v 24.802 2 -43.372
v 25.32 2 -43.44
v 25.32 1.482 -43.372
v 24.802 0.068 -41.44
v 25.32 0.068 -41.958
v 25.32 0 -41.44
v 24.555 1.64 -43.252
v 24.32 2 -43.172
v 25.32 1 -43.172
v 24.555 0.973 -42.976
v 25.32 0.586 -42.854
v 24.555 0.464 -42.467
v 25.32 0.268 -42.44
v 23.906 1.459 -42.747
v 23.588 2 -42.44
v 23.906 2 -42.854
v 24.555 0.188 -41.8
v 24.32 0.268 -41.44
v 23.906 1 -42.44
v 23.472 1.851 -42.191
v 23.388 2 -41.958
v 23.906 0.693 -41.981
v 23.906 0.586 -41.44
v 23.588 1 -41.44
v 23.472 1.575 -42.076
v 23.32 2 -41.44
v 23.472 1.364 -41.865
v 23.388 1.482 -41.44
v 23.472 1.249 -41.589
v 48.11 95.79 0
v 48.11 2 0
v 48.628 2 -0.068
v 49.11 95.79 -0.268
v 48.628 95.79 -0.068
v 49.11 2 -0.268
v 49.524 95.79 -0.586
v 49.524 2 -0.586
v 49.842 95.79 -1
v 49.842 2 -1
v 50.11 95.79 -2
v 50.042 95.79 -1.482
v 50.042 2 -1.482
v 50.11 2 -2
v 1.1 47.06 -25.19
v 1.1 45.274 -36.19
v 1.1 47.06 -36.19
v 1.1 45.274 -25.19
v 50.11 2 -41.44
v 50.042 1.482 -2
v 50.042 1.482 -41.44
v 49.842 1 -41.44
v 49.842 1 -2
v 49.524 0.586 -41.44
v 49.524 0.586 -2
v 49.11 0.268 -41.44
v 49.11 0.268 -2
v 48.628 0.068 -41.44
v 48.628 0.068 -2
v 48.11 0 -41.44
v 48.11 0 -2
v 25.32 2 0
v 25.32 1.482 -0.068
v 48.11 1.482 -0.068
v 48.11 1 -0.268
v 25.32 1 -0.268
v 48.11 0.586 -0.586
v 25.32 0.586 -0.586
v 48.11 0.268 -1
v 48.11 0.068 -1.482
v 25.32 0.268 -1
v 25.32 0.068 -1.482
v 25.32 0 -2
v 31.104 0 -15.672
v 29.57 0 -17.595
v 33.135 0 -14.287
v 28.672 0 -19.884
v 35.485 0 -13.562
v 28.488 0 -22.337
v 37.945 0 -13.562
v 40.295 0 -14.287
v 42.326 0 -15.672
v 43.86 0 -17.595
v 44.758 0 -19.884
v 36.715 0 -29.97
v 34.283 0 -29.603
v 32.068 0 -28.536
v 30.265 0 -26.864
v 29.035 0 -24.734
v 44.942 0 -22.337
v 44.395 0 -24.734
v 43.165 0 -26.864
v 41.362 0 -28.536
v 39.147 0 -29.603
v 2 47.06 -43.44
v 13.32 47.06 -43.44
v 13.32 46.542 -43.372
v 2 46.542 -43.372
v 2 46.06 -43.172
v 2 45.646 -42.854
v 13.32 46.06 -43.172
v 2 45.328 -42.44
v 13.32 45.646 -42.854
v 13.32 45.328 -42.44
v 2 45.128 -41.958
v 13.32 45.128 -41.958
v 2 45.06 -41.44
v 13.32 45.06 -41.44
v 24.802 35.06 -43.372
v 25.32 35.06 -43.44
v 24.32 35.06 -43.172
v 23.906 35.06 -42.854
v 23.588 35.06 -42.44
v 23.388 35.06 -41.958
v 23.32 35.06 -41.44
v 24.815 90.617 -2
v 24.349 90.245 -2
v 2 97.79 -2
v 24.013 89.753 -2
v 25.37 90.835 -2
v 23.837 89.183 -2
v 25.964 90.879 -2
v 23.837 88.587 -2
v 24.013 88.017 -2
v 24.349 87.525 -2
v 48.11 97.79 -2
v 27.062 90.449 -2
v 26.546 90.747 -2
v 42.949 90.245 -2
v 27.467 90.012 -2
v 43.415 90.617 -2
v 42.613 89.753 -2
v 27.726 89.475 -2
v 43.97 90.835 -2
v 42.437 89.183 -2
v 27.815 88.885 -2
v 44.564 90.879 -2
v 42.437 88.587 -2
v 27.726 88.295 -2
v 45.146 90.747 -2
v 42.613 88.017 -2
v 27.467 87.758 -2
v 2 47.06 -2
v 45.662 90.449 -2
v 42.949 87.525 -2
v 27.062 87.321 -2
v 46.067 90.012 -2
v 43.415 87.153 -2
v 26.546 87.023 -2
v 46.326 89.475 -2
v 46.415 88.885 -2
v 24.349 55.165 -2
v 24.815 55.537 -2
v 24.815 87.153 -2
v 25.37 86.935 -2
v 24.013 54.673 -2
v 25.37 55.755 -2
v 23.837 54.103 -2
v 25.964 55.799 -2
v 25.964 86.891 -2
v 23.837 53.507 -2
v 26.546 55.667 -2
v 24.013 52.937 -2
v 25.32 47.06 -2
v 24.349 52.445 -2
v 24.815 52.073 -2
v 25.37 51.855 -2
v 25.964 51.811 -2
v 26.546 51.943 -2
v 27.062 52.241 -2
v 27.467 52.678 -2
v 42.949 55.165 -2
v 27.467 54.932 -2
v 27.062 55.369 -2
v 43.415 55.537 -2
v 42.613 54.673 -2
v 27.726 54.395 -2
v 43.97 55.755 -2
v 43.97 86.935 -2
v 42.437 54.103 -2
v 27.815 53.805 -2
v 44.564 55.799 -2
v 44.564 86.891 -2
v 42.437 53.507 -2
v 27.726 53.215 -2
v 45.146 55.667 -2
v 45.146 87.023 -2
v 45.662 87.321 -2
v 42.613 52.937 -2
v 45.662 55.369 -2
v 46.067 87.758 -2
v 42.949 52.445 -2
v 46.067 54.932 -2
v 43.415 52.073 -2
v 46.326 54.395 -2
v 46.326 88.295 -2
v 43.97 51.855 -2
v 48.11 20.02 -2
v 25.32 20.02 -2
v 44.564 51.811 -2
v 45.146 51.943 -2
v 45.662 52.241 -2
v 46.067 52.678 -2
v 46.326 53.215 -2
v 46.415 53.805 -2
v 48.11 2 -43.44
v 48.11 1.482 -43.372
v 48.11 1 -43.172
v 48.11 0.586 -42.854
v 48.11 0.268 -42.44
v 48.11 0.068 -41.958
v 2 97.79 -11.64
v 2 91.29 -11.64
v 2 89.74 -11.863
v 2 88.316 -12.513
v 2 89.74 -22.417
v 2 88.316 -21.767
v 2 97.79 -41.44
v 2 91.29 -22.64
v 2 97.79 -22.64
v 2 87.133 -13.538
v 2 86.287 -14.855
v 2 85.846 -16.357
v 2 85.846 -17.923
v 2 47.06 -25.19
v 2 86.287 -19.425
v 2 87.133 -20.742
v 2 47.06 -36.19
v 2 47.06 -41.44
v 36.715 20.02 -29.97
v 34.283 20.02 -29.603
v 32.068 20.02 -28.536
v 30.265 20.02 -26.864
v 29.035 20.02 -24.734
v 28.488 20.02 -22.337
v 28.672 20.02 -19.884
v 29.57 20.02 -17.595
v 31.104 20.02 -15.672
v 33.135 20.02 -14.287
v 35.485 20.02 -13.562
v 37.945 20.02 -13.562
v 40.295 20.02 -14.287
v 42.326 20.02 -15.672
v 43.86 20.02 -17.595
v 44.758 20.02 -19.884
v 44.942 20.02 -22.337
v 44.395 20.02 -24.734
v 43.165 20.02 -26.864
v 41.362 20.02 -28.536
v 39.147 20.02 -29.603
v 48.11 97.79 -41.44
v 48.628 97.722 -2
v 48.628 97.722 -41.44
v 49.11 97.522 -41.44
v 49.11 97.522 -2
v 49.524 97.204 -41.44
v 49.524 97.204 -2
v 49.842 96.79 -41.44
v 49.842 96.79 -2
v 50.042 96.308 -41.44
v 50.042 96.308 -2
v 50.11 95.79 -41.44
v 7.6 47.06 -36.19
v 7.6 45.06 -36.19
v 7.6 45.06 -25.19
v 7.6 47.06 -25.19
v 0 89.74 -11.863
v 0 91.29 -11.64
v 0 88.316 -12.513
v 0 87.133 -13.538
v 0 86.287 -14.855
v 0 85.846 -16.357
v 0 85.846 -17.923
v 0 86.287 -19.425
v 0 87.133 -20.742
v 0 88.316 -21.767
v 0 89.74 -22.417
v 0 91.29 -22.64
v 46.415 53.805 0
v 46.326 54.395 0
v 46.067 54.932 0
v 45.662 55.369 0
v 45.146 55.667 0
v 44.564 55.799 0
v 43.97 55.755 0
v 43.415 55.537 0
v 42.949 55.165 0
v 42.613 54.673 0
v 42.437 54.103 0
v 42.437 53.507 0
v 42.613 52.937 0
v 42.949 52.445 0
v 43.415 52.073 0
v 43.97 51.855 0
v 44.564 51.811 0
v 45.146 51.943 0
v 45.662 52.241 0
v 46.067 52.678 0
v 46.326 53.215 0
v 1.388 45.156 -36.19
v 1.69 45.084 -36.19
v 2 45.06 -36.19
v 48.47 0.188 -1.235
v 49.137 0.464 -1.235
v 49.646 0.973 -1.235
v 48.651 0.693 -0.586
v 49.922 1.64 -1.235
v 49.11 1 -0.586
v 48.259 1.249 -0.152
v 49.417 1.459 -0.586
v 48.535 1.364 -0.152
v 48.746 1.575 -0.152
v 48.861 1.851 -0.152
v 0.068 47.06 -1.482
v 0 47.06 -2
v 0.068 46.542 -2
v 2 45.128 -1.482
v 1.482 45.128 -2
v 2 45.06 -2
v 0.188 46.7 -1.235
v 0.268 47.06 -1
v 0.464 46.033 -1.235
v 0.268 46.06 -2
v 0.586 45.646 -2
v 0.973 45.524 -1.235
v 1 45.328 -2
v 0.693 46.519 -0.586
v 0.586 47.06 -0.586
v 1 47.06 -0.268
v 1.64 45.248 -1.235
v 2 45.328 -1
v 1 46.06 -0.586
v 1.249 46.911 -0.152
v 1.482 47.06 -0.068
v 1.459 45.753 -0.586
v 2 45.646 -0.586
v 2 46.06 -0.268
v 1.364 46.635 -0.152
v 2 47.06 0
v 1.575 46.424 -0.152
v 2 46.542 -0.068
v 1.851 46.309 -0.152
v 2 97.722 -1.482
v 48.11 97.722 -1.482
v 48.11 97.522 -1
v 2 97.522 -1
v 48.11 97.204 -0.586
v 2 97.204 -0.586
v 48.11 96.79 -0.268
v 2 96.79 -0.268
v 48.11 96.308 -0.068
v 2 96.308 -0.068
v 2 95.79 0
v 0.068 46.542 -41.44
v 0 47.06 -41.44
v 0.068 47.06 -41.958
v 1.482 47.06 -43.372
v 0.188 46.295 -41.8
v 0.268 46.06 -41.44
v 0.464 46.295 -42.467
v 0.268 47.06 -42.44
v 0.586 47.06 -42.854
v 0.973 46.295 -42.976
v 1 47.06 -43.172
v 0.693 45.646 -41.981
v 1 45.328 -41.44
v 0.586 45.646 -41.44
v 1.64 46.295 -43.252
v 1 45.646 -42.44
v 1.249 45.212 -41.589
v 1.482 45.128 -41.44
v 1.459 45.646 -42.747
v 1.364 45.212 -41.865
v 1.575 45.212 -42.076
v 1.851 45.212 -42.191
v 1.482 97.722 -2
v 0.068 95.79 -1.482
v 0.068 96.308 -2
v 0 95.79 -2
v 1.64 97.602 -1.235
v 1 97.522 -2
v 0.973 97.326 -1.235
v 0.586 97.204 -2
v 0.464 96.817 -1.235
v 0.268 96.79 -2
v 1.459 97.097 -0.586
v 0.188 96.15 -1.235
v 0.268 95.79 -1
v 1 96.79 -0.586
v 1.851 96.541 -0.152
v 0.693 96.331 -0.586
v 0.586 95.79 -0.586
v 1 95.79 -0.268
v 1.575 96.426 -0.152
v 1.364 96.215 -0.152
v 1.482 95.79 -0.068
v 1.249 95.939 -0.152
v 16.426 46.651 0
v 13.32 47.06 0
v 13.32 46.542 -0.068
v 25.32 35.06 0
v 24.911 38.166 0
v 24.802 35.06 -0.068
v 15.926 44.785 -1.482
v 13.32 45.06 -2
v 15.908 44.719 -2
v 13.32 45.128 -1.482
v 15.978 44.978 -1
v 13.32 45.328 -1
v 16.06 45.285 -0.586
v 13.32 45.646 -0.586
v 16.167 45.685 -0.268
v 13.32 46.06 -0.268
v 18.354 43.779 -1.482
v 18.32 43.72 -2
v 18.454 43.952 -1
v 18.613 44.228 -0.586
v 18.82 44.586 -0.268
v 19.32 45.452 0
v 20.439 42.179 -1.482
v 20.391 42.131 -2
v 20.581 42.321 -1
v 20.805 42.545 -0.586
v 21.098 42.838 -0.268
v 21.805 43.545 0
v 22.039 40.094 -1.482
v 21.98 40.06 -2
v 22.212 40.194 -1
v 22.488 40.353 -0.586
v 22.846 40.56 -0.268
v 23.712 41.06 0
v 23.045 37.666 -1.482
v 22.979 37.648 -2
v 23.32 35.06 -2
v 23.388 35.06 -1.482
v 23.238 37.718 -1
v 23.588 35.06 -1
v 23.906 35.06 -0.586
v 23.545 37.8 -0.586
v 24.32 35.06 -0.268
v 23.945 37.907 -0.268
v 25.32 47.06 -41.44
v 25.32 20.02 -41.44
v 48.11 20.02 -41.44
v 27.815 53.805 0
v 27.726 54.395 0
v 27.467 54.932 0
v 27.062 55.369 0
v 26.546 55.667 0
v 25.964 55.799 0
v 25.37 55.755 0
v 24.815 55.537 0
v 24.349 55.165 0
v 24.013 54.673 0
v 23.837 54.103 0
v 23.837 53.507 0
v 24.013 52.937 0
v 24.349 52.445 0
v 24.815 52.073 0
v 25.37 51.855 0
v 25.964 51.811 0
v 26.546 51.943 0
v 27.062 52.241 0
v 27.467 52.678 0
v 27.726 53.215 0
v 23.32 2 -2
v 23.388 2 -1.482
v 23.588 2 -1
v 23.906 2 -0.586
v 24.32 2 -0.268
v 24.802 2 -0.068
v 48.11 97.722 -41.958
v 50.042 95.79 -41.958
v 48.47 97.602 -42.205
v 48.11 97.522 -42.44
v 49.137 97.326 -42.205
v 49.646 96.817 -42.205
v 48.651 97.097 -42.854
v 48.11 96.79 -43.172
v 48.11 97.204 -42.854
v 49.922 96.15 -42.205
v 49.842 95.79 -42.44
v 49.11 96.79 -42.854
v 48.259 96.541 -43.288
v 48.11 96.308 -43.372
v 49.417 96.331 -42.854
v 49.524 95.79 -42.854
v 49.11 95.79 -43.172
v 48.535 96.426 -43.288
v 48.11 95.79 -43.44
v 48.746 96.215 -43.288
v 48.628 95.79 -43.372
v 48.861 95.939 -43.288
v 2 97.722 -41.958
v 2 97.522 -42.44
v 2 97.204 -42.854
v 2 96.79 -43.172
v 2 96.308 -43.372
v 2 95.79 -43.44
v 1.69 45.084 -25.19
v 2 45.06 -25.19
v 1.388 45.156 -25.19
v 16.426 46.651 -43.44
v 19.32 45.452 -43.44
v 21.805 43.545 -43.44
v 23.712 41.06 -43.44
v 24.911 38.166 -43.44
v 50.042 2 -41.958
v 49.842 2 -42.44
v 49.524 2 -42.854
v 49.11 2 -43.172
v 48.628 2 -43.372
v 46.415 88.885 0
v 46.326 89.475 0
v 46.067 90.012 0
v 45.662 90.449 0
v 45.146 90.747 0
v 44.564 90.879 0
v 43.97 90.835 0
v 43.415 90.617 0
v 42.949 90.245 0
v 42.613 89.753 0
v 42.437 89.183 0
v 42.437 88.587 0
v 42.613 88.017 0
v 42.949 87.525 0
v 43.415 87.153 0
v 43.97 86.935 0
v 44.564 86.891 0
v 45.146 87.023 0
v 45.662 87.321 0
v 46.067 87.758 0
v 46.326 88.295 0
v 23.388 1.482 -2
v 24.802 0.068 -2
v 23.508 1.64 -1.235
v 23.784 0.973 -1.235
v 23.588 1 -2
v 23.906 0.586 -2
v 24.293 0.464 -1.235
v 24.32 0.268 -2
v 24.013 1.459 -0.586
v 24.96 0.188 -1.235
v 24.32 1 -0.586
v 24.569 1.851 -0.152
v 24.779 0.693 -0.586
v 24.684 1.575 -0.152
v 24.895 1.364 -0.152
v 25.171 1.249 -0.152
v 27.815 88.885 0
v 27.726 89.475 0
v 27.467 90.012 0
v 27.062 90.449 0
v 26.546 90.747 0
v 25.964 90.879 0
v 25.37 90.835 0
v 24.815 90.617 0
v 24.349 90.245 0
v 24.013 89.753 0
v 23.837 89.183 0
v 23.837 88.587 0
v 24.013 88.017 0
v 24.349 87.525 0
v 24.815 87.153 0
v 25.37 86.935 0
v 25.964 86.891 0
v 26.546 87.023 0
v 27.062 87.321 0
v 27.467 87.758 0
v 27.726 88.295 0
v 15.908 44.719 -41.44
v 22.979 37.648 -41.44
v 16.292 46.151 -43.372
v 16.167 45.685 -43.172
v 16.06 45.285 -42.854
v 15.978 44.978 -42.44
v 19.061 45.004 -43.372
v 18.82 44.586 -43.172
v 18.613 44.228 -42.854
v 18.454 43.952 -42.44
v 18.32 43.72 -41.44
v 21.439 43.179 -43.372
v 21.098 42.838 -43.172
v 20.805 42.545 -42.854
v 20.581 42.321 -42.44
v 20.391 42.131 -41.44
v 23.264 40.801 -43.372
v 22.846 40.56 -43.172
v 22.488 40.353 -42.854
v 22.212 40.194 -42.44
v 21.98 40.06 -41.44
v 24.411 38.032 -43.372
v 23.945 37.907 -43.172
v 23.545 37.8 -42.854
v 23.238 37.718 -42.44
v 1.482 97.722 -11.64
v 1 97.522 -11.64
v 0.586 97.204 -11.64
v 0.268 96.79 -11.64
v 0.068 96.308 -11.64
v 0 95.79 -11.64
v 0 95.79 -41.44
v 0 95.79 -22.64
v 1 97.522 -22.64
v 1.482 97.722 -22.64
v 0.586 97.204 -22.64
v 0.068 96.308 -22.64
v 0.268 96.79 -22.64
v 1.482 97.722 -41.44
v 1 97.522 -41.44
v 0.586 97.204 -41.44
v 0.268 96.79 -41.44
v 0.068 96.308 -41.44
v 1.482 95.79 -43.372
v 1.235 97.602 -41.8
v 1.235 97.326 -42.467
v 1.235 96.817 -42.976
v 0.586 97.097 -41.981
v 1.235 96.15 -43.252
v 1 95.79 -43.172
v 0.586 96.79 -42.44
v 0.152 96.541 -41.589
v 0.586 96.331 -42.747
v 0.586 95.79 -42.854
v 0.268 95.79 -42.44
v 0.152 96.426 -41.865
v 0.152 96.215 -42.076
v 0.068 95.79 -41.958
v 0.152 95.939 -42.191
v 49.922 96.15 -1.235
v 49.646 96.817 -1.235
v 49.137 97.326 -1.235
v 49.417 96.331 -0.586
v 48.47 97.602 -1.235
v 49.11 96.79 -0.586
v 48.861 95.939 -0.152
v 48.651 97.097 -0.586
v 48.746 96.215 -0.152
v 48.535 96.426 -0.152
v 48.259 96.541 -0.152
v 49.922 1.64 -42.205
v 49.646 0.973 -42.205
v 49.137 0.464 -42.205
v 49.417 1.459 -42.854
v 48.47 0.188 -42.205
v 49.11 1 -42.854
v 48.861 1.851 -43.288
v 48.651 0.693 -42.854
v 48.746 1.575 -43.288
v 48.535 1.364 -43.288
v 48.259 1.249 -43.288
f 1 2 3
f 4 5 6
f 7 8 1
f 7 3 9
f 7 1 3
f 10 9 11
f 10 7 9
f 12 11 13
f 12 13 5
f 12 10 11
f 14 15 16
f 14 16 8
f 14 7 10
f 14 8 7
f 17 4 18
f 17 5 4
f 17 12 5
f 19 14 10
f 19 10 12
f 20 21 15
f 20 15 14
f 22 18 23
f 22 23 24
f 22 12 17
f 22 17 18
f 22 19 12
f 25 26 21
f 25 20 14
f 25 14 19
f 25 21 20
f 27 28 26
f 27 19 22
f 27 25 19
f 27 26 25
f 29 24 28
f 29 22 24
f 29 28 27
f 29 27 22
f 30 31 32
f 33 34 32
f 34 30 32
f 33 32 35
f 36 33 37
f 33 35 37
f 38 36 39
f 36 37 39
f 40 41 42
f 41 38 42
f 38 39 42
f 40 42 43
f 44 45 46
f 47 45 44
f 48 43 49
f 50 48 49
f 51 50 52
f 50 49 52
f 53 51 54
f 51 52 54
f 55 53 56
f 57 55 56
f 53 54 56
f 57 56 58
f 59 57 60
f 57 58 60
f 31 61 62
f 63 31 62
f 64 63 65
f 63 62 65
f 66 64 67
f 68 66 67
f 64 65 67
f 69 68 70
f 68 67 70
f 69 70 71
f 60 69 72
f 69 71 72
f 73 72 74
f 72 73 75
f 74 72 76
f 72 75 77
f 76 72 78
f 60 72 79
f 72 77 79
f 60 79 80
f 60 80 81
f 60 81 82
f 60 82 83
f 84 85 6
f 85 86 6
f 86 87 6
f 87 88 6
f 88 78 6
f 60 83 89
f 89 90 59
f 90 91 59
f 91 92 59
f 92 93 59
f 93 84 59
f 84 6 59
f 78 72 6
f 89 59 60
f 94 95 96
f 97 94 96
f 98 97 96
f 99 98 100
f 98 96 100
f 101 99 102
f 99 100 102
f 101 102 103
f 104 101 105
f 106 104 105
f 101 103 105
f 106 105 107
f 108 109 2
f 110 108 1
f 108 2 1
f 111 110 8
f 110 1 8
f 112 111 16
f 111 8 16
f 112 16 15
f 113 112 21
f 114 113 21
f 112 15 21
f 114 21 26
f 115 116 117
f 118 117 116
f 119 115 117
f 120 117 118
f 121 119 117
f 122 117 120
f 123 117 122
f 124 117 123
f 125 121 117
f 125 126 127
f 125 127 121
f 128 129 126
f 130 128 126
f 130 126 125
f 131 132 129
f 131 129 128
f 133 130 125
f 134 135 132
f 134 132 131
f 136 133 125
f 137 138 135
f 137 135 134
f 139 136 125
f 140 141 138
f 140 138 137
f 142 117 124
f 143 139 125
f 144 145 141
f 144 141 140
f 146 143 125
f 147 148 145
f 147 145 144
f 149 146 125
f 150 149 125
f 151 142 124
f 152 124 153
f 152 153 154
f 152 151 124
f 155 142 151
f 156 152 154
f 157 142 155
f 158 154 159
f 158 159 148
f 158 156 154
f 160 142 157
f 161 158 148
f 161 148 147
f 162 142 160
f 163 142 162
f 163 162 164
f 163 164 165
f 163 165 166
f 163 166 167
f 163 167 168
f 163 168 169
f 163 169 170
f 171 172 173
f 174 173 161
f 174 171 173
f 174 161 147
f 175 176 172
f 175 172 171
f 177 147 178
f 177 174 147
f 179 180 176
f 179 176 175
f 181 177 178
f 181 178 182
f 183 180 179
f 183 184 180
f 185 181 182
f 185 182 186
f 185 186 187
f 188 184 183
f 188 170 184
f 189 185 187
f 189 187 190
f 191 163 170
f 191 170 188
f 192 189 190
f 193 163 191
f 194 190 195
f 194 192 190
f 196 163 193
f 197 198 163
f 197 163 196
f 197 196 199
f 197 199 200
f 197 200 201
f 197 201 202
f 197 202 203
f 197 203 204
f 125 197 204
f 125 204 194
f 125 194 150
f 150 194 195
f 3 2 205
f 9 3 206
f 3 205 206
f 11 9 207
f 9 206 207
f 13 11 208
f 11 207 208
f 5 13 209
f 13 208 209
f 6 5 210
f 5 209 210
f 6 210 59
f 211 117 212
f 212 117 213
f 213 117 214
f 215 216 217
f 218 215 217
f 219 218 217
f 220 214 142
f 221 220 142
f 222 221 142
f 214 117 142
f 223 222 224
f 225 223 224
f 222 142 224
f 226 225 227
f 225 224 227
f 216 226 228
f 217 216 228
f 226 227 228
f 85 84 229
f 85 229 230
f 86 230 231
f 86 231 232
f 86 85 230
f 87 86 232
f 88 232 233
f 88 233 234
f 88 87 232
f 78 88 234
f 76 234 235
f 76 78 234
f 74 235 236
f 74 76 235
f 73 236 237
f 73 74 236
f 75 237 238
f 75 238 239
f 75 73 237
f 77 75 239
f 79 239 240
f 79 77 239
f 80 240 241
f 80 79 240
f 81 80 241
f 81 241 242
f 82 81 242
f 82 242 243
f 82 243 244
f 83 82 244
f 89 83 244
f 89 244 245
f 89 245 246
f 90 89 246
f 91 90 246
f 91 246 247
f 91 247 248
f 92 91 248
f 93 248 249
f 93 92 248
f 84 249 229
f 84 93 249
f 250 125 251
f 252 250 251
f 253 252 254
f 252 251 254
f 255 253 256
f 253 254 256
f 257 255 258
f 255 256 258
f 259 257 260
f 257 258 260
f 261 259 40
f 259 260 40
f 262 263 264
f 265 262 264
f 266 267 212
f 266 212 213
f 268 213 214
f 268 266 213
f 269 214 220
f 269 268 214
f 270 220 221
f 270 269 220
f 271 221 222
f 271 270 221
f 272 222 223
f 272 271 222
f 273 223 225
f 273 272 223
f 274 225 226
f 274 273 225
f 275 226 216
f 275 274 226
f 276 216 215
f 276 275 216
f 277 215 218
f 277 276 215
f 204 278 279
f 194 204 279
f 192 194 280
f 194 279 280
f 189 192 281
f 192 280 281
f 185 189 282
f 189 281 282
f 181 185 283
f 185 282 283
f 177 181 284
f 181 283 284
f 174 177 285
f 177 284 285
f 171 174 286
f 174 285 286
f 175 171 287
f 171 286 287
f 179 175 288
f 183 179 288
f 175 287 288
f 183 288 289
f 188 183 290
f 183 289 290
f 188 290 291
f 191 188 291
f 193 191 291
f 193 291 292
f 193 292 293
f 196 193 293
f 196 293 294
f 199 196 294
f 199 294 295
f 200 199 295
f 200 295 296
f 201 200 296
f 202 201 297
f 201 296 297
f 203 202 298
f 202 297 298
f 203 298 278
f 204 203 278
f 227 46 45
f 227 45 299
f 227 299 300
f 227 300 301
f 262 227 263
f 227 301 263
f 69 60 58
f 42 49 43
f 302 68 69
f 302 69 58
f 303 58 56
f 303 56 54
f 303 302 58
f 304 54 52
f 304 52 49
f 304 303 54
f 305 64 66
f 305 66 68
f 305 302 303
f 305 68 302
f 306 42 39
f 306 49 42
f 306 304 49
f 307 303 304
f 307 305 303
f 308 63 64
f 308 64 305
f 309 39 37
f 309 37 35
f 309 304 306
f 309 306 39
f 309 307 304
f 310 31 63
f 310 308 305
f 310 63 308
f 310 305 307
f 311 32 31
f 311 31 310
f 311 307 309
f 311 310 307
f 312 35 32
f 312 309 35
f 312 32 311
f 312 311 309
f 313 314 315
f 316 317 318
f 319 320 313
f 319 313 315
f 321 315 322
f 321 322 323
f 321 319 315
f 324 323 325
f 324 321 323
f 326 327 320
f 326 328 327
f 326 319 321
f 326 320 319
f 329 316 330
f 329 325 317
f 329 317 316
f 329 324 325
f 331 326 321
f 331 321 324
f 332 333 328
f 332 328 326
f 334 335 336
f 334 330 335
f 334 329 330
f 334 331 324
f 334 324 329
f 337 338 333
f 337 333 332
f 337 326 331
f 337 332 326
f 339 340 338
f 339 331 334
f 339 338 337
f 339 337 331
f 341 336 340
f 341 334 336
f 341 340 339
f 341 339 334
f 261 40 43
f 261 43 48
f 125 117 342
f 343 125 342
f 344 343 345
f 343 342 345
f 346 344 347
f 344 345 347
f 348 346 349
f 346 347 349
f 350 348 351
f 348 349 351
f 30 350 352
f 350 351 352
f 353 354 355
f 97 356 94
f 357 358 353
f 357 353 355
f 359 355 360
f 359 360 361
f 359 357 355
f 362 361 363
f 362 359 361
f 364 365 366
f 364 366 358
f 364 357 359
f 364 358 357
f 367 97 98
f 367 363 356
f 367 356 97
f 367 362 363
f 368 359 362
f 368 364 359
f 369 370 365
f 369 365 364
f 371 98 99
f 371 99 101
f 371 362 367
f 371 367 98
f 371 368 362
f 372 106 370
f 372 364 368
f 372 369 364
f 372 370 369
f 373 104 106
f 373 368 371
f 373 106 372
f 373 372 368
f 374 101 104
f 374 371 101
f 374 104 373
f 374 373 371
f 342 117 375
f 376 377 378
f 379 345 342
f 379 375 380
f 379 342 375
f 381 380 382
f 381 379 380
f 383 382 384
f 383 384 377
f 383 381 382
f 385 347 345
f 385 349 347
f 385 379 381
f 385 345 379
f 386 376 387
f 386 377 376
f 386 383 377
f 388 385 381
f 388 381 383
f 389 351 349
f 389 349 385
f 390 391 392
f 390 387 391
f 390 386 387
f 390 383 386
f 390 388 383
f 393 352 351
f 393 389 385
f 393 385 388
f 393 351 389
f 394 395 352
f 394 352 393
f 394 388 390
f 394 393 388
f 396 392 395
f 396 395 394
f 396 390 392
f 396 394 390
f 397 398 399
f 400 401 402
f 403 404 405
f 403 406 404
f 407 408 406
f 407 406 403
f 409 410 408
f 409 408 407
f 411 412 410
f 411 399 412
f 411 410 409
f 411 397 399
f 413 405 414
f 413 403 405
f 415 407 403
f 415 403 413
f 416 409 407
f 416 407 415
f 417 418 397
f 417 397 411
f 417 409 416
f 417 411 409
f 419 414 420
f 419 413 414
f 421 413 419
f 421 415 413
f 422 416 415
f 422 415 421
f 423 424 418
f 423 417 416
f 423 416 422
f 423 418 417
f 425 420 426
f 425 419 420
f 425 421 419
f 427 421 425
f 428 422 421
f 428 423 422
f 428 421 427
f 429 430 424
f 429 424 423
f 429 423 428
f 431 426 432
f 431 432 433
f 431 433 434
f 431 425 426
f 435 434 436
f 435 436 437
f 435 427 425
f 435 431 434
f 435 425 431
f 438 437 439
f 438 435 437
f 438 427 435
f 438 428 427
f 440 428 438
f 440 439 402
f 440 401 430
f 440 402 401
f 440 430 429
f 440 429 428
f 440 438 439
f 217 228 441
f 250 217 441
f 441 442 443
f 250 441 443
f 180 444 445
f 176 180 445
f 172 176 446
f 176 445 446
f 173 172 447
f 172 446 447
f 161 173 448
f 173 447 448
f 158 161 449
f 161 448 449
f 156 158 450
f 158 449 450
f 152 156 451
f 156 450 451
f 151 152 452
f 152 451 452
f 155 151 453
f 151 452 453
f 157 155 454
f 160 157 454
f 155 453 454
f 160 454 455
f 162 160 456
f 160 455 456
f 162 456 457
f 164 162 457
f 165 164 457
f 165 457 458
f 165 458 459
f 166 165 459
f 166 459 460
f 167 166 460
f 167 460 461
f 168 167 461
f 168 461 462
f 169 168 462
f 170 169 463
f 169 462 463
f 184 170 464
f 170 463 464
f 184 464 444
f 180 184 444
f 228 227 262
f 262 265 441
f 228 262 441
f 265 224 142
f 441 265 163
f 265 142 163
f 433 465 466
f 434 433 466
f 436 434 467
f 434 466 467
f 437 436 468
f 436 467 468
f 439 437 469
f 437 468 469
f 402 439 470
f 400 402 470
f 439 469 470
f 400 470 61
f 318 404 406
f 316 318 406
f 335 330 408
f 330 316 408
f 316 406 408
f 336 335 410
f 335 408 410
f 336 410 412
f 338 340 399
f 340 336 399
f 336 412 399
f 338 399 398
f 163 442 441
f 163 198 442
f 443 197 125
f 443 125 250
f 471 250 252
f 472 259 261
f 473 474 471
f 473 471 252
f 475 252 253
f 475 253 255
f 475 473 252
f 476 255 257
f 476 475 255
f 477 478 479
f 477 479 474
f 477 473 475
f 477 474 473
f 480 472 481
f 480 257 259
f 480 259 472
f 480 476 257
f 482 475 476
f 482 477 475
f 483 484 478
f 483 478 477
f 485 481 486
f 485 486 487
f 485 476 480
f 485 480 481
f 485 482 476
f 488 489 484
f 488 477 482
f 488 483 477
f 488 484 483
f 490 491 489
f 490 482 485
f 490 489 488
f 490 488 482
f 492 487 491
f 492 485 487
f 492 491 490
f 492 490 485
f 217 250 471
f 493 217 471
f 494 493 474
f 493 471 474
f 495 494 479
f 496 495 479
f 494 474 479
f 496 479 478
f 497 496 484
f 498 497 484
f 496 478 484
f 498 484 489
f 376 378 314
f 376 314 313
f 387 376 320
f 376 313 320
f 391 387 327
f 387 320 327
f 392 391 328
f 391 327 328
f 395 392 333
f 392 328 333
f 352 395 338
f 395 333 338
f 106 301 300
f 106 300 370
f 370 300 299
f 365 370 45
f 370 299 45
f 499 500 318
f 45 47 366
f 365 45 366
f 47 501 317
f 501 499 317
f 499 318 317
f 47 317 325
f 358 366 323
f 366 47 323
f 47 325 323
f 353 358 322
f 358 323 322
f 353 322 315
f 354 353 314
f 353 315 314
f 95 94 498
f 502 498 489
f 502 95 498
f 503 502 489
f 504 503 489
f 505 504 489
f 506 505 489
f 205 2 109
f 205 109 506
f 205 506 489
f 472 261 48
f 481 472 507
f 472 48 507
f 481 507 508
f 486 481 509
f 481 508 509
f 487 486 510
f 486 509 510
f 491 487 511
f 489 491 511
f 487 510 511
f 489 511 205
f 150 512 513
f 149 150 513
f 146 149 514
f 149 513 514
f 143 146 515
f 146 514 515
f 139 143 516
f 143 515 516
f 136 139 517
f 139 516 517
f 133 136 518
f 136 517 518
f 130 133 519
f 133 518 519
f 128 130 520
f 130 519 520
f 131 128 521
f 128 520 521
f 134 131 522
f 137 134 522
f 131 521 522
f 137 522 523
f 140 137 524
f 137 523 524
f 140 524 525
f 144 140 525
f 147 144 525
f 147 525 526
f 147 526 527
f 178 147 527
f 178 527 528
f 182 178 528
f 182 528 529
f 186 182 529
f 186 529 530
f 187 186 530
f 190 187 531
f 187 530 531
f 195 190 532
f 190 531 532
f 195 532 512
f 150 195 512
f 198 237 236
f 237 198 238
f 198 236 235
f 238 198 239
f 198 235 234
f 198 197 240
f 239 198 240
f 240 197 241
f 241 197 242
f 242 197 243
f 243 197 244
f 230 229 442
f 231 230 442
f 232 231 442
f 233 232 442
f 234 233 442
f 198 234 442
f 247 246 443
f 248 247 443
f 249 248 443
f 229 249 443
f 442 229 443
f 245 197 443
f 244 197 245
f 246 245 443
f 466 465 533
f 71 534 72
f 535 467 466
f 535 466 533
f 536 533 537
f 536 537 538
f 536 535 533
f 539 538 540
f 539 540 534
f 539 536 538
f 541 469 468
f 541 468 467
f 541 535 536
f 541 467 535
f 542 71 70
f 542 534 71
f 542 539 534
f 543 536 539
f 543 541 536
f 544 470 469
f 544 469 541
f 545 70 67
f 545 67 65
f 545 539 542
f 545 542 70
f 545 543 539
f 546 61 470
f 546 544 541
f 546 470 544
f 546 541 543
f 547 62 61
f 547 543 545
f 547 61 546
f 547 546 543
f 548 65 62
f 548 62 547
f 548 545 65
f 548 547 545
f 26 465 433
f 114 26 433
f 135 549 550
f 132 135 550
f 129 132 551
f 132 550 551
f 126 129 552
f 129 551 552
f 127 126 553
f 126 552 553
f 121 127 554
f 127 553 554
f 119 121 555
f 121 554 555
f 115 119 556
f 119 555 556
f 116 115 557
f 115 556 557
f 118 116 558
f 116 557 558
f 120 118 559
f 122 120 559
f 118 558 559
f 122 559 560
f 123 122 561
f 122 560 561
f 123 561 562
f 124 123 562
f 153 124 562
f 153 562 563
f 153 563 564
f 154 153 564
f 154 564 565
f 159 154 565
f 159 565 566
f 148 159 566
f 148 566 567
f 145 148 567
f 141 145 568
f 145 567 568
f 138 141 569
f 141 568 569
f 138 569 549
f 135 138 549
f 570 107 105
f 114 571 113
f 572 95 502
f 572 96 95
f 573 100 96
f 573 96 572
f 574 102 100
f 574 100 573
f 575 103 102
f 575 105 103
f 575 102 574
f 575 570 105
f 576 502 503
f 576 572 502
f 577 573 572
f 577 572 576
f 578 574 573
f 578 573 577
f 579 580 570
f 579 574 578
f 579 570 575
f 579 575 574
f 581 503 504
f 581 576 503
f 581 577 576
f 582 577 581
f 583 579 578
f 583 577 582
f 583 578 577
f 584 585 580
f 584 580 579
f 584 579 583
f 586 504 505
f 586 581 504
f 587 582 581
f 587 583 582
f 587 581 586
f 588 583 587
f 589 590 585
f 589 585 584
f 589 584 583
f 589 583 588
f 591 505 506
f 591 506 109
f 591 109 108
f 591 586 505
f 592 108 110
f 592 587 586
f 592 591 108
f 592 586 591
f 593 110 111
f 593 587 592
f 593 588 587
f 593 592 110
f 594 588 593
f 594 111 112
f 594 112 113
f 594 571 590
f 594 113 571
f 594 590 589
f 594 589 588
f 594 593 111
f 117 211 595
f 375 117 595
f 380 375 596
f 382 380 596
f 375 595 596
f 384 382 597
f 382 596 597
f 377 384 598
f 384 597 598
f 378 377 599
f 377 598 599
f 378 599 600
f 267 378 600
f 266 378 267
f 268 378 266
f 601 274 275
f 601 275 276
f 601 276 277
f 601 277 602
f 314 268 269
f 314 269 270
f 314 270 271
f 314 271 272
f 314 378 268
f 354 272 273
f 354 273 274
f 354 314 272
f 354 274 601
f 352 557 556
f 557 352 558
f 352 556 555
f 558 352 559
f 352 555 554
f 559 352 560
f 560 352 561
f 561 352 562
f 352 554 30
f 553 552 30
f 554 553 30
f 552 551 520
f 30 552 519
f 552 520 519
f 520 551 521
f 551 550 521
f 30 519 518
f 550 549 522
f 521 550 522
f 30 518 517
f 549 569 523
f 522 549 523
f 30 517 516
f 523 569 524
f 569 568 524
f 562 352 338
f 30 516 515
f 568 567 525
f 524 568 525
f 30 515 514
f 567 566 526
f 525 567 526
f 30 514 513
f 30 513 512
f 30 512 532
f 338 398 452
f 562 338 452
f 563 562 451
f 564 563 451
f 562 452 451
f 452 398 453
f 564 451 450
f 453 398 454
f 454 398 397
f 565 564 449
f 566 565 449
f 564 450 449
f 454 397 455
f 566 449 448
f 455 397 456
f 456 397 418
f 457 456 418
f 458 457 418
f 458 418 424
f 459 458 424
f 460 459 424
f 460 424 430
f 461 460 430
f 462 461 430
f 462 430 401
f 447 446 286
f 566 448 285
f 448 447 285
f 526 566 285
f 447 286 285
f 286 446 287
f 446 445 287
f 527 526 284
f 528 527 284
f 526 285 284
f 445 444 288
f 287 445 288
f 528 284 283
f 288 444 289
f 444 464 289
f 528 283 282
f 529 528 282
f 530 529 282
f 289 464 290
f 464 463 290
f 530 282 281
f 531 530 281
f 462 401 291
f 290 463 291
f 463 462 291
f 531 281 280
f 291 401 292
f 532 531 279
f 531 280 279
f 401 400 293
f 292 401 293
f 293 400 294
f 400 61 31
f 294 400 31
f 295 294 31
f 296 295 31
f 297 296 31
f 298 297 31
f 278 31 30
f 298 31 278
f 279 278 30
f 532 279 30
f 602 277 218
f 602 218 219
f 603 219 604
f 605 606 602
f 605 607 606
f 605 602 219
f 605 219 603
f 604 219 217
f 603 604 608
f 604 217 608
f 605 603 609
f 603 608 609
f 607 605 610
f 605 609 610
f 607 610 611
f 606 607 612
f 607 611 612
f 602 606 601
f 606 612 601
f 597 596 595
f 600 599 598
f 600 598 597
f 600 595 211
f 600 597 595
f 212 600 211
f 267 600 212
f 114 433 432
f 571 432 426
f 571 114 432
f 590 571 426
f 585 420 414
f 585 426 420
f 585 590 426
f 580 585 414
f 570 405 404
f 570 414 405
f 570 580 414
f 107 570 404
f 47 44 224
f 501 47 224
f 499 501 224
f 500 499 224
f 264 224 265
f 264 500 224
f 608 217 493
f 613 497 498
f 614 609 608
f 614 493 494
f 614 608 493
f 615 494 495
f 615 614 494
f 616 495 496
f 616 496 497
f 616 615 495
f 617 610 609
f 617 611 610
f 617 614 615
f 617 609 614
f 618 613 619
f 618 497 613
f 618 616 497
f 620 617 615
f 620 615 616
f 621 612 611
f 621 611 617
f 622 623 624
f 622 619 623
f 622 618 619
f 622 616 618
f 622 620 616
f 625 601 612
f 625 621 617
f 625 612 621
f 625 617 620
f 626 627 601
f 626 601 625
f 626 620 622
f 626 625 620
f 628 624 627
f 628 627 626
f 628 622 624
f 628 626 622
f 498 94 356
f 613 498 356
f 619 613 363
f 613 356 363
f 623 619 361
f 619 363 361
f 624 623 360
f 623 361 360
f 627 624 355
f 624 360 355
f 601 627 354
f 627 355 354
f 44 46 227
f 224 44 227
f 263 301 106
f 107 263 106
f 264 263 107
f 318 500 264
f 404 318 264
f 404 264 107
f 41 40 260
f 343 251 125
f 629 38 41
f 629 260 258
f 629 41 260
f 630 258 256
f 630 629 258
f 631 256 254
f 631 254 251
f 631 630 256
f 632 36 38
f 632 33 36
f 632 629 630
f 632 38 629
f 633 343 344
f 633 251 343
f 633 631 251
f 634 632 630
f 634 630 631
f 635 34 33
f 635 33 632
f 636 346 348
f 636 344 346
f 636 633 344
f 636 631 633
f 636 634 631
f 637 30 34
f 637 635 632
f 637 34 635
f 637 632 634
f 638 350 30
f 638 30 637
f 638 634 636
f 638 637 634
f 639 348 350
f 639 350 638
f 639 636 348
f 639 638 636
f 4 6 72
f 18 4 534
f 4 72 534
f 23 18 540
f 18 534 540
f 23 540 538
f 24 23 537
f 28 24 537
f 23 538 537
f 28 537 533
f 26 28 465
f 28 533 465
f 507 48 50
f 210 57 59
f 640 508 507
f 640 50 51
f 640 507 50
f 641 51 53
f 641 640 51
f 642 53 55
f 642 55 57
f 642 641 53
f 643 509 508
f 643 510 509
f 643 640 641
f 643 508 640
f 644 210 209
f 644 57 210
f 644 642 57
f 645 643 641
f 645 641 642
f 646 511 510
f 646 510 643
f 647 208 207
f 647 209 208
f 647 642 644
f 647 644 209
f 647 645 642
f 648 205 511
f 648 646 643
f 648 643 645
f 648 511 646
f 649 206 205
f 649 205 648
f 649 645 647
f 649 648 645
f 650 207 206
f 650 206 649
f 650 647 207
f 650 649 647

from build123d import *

# Parameters (mm, degrees)
SKETCH1_W                 = 50.11
SKETCH1_H                 = 43.44
BOSS_EXTRUDE1_DEPTH       = 97.79
SKETCH2_W                 = 23.32
SKETCH2_H                 = 45.06
CUT_EXTRUDE1_DEPTH        = 119.156378584
SHELL1_T                  = -2
SHELL1_THICKNESS_2_FACE_W = 39.44
SHELL1_THICKNESS_2_FACE_H = 22.79
SHELL1_THICKNESS_2_DEPTH  = 18.02
SKETCH4_W                 = 6.5
SKETCH4_H                 = 11
CUT_EXTRUDE2_DEPTH        = 2
SKETCH6_R                 = 2
CUT_EXTRUDE3_DEPTH        = 2
CUT_EXTRUDE5_DEPTH        = 2
SKETCH8_R                 = 8.25
CUT_EXTRUDE6_DEPTH        = 20.02
FILLET1_R                 = 10
FILLET2_R                 = 2


with BuildPart() as part:
    # Sketch1 → Boss-Extrude1 (new body)
    with BuildSketch(Plane(origin=(0, 0, 0), x_dir=(1, 0, 0), z_dir=(0, 1, 0))):
        with Locations((25.055, 21.72)):
            Rectangle(SKETCH1_W, SKETCH1_H)
    extrude(amount=BOSS_EXTRUDE1_DEPTH)

    # Sketch2 → Cut-Extrude1 (cut, through all)
    with BuildSketch(Plane.XY):
        with Locations((11.66, 22.53)):
            Rectangle(SKETCH2_W, SKETCH2_H)
    extrude(amount=-CUT_EXTRUDE1_DEPTH, mode=Mode.SUBTRACT)

    # Shell1
    shell1_openings = [part.faces().sort_by_distance(p)[0] for p in [
        (25.055, 97.79, -21.72),
    ]]
    offset(amount=SHELL1_T, openings=shell1_openings, kind=Kind.INTERSECTION)

    # Shell1 thickness 2 face (on inner face of the shell) → Shell1 thickness 2 (add)
    with BuildSketch(Plane(origin=(36.715, 2, -21.72), x_dir=(0, 0, -1), z_dir=(0, -1, 0))):
        Rectangle(SHELL1_THICKNESS_2_FACE_W, SHELL1_THICKNESS_2_FACE_H)
    extrude(amount=-SHELL1_THICKNESS_2_DEPTH)

    # Sketch4 → Cut-Extrude2 (cut)
    with BuildSketch(Plane.XZ.offset(-45.06)):
        with Locations((4.35, -30.69)):
            Rectangle(SKETCH4_W, SKETCH4_H)
    extrude(amount=-CUT_EXTRUDE2_DEPTH, mode=Mode.SUBTRACT)

    # Sketch6 → Cut-Extrude3 (cut)
    with BuildSketch(Plane.XY):
        with Locations((44.415, 88.885)):
            Circle(SKETCH6_R)
        with Locations((25.815, 88.885)):
            Circle(SKETCH6_R)
        with Locations((44.415, 53.805)):
            Circle(SKETCH6_R)
        with Locations((25.815, 53.805)):
            Circle(SKETCH6_R)
    extrude(amount=-CUT_EXTRUDE3_DEPTH, mode=Mode.SUBTRACT)

    # Sketch7 → Cut-Extrude5 (cut)
    with BuildSketch(Plane(origin=(0, 0, 0), x_dir=(0, 0, -1), z_dir=(1, 0, 0))):
        with BuildLine():
            Line((22.64, 91.29), (22.64, 97.79))
            Line((22.64, 97.79), (11.64, 97.79))
            Line((11.64, 97.79), (11.64, 91.29))
            ThreePointArc((11.64, 91.29), (17.14, 85.79), (22.64, 91.29))
        make_face()
    extrude(amount=CUT_EXTRUDE5_DEPTH, mode=Mode.SUBTRACT)

    # Sketch8 → Cut-Extrude6 (cut)
    with BuildSketch(Plane(origin=(0, 0, 0), x_dir=(1, 0, 0), z_dir=(0, 1, 0))):
        with Locations(Location((36.715, 21.72, 0), (0, 0, 90))):
            Circle(SKETCH8_R)
    extrude(amount=CUT_EXTRUDE6_DEPTH, mode=Mode.SUBTRACT)

    # Fillet1
    fillet1_edges = [part.edges().sort_by_distance(p)[0] for p in [
        (23.32, 45.06, -21.72),
    ]]
    fillet(fillet1_edges, radius=FILLET1_R)

    # Fillet2
    # the kernel refuses this fillet: 2 mm, written as the material it takes off along each edge
    with BuildSketch(Plane(origin=(2, 47.06, -2), x_dir=(0, -1, 0), z_dir=(0, 0, 1))) as fillet2_piece_1_section:
        Polygon((0, 0), (FILLET2_R, 0), (FILLET2_R, -FILLET2_R), (0, -FILLET2_R), align=None)
    fillet2_piece_1 = extrude(amount=FILLET2_R, mode=Mode.PRIVATE)
    fillet2_piece_1 = fillet2_piece_1 - Plane(origin=(2, 47.06, -2), x_dir=(0.7071067811865475, 0.7071067811865475, 0), z_dir=(0, 0, 1)) * Sphere(FILLET2_R, mode=Mode.PRIVATE)
    add(fillet2_piece_1, mode=Mode.SUBTRACT)
    with BuildSketch(Plane(origin=(2, 47.06, -41.44), x_dir=(-1, 0, 0), z_dir=(0, -1, 0))) as fillet2_piece_2_section:
        Polygon((0, 0), (FILLET2_R, 0), (FILLET2_R, FILLET2_R), (0, FILLET2_R), align=None)
    fillet2_piece_2 = extrude(amount=FILLET2_R, mode=Mode.PRIVATE)
    fillet2_piece_2 = fillet2_piece_2 - Plane(origin=(2, 47.06, -41.44), x_dir=(0.7071067811865475, 0, 0.7071067811865475), z_dir=(0, -1, 0)) * Sphere(FILLET2_R, mode=Mode.PRIVATE)
    add(fillet2_piece_2, mode=Mode.SUBTRACT)
    with BuildSketch(Plane(origin=(2, 95.79, -2), x_dir=(-1, 0, 0), z_dir=(0, 0, 1))) as fillet2_piece_3_section:
        Polygon((0, 0), (FILLET2_R, 0), (FILLET2_R, -FILLET2_R), (0, -FILLET2_R), align=None)
    fillet2_piece_3 = extrude(amount=FILLET2_R, mode=Mode.PRIVATE)
    fillet2_piece_3 = fillet2_piece_3 - Plane(origin=(2, 95.79, -2), x_dir=(0.7071067811865475, -0.7071067811865475, 0), z_dir=(0, 0, 1)) * Sphere(FILLET2_R, mode=Mode.PRIVATE)
    add(fillet2_piece_3, mode=Mode.SUBTRACT)
    with BuildSketch(Plane(origin=(2, 95.79, -41.44), x_dir=(0, 0, -1), z_dir=(-1, 0, 0))) as fillet2_piece_4_section:
        Polygon((0, 0), (FILLET2_R, 0), (FILLET2_R, -FILLET2_R), (0, -FILLET2_R), align=None)
    fillet2_piece_4 = extrude(amount=FILLET2_R, mode=Mode.PRIVATE)
    fillet2_piece_4 = fillet2_piece_4 - Plane(origin=(2, 95.79, -41.44), x_dir=(0, -0.7071067811865475, 0.7071067811865475), z_dir=(-1, 0, 0)) * Sphere(FILLET2_R, mode=Mode.PRIVATE)
    add(fillet2_piece_4, mode=Mode.SUBTRACT)
    with BuildSketch(Plane(origin=(25.32, 2, -2), x_dir=(-1, 0, 0), z_dir=(0, 0, 1))) as fillet2_piece_5_section:
        Polygon((0, 0), (FILLET2_R, 0), (FILLET2_R, FILLET2_R), (0, FILLET2_R), align=None)
    fillet2_piece_5 = extrude(amount=FILLET2_R, mode=Mode.PRIVATE)
    fillet2_piece_5 = fillet2_piece_5 - Plane(origin=(25.32, 2, -2), x_dir=(0.7071067811865475, 0.7071067811865475, 0), z_dir=(0, 0, 1)) * Sphere(FILLET2_R, mode=Mode.PRIVATE)
    add(fillet2_piece_5, mode=Mode.SUBTRACT)
    with BuildSketch(Plane(origin=(25.32, 2, -41.44), x_dir=(0, 0, -1), z_dir=(-1, 0, 0))) as fillet2_piece_6_section:
        Polygon((0, 0), (FILLET2_R, 0), (FILLET2_R, FILLET2_R), (0, FILLET2_R), align=None)
    fillet2_piece_6 = extrude(amount=FILLET2_R, mode=Mode.PRIVATE)
    fillet2_piece_6 = fillet2_piece_6 - Plane(origin=(25.32, 2, -41.44), x_dir=(0, 0.7071067811865475, 0.7071067811865475), z_dir=(-1, 0, 0)) * Sphere(FILLET2_R, mode=Mode.PRIVATE)
    add(fillet2_piece_6, mode=Mode.SUBTRACT)
    with BuildSketch(Plane(origin=(48.11, 2, -2), x_dir=(0, -1, 0), z_dir=(0, 0, 1))) as fillet2_piece_7_section:
        Polygon((0, 0), (FILLET2_R, 0), (FILLET2_R, FILLET2_R), (0, FILLET2_R), align=None)
    fillet2_piece_7 = extrude(amount=FILLET2_R, mode=Mode.PRIVATE)
    fillet2_piece_7 = fillet2_piece_7 - Plane(origin=(48.11, 2, -2), x_dir=(-0.7071067811865475, 0.7071067811865475, 0), z_dir=(0, 0, 1)) * Sphere(FILLET2_R, mode=Mode.PRIVATE)
    add(fillet2_piece_7, mode=Mode.SUBTRACT)
    with BuildSketch(Plane(origin=(48.11, 95.79, -2), x_dir=(0, 1, 0), z_dir=(0, 0, 1))) as fillet2_piece_8_section:
        Polygon((0, 0), (FILLET2_R, 0), (FILLET2_R, -FILLET2_R), (0, -FILLET2_R), align=None)
    fillet2_piece_8 = extrude(amount=FILLET2_R, mode=Mode.PRIVATE)
    fillet2_piece_8 = fillet2_piece_8 - Plane(origin=(48.11, 95.79, -2), x_dir=(-0.7071067811865475, -0.7071067811865475, 0), z_dir=(0, 0, 1)) * Sphere(FILLET2_R, mode=Mode.PRIVATE)
    add(fillet2_piece_8, mode=Mode.SUBTRACT)
    with BuildSketch(Plane(origin=(48.11, 95.79, -41.44), x_dir=(0, 1, 0), z_dir=(0, 0, -1))) as fillet2_piece_9_section:
        Polygon((0, 0), (FILLET2_R, 0), (FILLET2_R, FILLET2_R), (0, FILLET2_R), align=None)
    fillet2_piece_9 = extrude(amount=FILLET2_R, mode=Mode.PRIVATE)
    fillet2_piece_9 = fillet2_piece_9 - Plane(origin=(48.11, 95.79, -41.44), x_dir=(-0.7071067811865475, -0.7071067811865475, 0), z_dir=(0, 0, -1)) * Sphere(FILLET2_R, mode=Mode.PRIVATE)
    add(fillet2_piece_9, mode=Mode.SUBTRACT)
    with BuildSketch(Plane(origin=(48.11, 2, -41.44), x_dir=(0, -1, 0), z_dir=(0, 0, -1))) as fillet2_piece_10_section:
        Polygon((0, 0), (FILLET2_R, 0), (FILLET2_R, -FILLET2_R), (0, -FILLET2_R), align=None)
    fillet2_piece_10 = extrude(amount=FILLET2_R, mode=Mode.PRIVATE)
    fillet2_piece_10 = fillet2_piece_10 - Plane(origin=(48.11, 2, -41.44), x_dir=(-0.7071067811865475, 0.7071067811865475, 0), z_dir=(0, 0, -1)) * Sphere(FILLET2_R, mode=Mode.PRIVATE)
    add(fillet2_piece_10, mode=Mode.SUBTRACT)
    with BuildSketch(Plane(origin=(0, 45.06, -2), x_dir=(1, 0, 0), z_dir=(0, 0, -1)), Plane(origin=(50.11, 97.79, -2), x_dir=(-1, 0, 0), z_dir=(0, 0, -1))) as fillet2_piece_11:
        with BuildLine():
            CenterArc((FILLET2_R, -FILLET2_R), FILLET2_R, 90, 90)
            Line((0, -FILLET2_R), (0, 0))
            Line((0, 0), (FILLET2_R, 0))
        make_face()
    extrude(amount=39.44, mode=Mode.SUBTRACT)
    with BuildSketch(Plane(origin=(0, 97.79, -16.64), x_dir=(0, -1, 0), z_dir=(0, 0, 1))) as fillet2_piece_12:
        with BuildLine():
            CenterArc((FILLET2_R, FILLET2_R), FILLET2_R, 180, 90)
            Line((0, FILLET2_R), (0, 0))
            Line((0, 0), (FILLET2_R, 0))
        make_face()
    extrude(amount=14.64, mode=Mode.SUBTRACT)
    with BuildSketch(Plane(origin=(0, 47.06, 0), x_dir=(1, 0, 0), z_dir=(0, 1, 0)), Plane(origin=(0, 47.06, -43.44), x_dir=(0, 0, 1), z_dir=(0, 1, 0))) as fillet2_piece_13:
        with BuildLine():
            CenterArc((FILLET2_R, FILLET2_R), FILLET2_R, 180, 90)
            Line((0, FILLET2_R), (0, 0))
            Line((0, 0), (FILLET2_R, 0))
        make_face()
    extrude(amount=48.73, mode=Mode.SUBTRACT)
    with BuildSketch(Plane(origin=(0, 97.79, -41.44), x_dir=(0, -1, 0), z_dir=(0, 0, 1))) as fillet2_piece_14:
        with BuildLine():
            CenterArc((FILLET2_R, FILLET2_R), FILLET2_R, 180, 90)
            Line((0, FILLET2_R), (0, 0))
            Line((0, 0), (FILLET2_R, 0))
        make_face()
    extrude(amount=23.8, mode=Mode.SUBTRACT)
    with BuildSketch(Plane(origin=(13.32, 45.06, 0), x_dir=(0, 1, 0), z_dir=(-1, 0, 0)), Plane(origin=(13.32, 45.06, -43.44), x_dir=(0, 0, 1), z_dir=(-1, 0, 0))) as fillet2_piece_15:
        with BuildLine():
            CenterArc((FILLET2_R, FILLET2_R), FILLET2_R, 180, 90)
            Line((0, FILLET2_R), (0, 0))
            Line((0, 0), (FILLET2_R, 0))
        make_face()
    extrude(amount=11.32, mode=Mode.SUBTRACT)
    with BuildSketch(Plane(origin=(23.32, 2, 0), x_dir=(1, 0, 0), z_dir=(0, 1, 0)), Plane(origin=(23.32, 2, -43.44), x_dir=(0, 0, 1), z_dir=(0, 1, 0))) as fillet2_piece_16:
        with BuildLine():
            CenterArc((FILLET2_R, FILLET2_R), FILLET2_R, 180, 90)
            Line((0, FILLET2_R), (0, 0))
            Line((0, 0), (FILLET2_R, 0))
        make_face()
    extrude(amount=33.06, mode=Mode.SUBTRACT)
    with BuildSketch(Plane(origin=(50.11, 2, 0), x_dir=(-1, 0, 0), z_dir=(0, 1, 0)), Plane(origin=(50.11, 2, -43.44), x_dir=(0, 0, 1), z_dir=(0, 1, 0))) as fillet2_piece_17:
        with BuildLine():
            CenterArc((FILLET2_R, -FILLET2_R), FILLET2_R, 90, 90)
            Line((0, -FILLET2_R), (0, 0))
            Line((0, 0), (FILLET2_R, 0))
        make_face()
    extrude(amount=93.79, mode=Mode.SUBTRACT)
    with BuildSketch(Plane(origin=(25.32, 0, 0), x_dir=(0, 1, 0), z_dir=(1, 0, 0))) as fillet2_piece_18:
        with BuildLine():
            CenterArc((FILLET2_R, -FILLET2_R), FILLET2_R, 90, 90)
            Line((0, -FILLET2_R), (0, 0))
            Line((0, 0), (FILLET2_R, 0))
        make_face()
    extrude(amount=22.79, mode=Mode.SUBTRACT)
    with BuildSketch(Plane(origin=(50.11, 0, -2), x_dir=(-1, 0, 0), z_dir=(0, 0, -1)), Plane(origin=(23.32, 0, -2), x_dir=(0, 1, 0), z_dir=(0, 0, -1))) as fillet2_piece_19:
        with BuildLine():
            CenterArc((FILLET2_R, FILLET2_R), FILLET2_R, 180, 90)
            Line((0, FILLET2_R), (0, 0))
            Line((0, 0), (FILLET2_R, 0))
        make_face()
    extrude(amount=39.44, mode=Mode.SUBTRACT)
    with BuildSketch(Plane(origin=(48.11, 0, -43.44), x_dir=(0, 0, 1), z_dir=(-1, 0, 0))) as fillet2_piece_20:
        with BuildLine():
            CenterArc((FILLET2_R, FILLET2_R), FILLET2_R, 180, 90)
            Line((0, FILLET2_R), (0, 0))
            Line((0, 0), (FILLET2_R, 0))
        make_face()
    extrude(amount=22.79, mode=Mode.SUBTRACT)
    with BuildSketch(Plane(origin=(13.32, 35.06, 0), x_dir=(0, 1, 0), z_dir=(-1, 0, 0))) as fillet2_piece_21:
        with BuildLine():
            CenterArc((10 + FILLET2_R, FILLET2_R), FILLET2_R, 180, 90)
            Line((10, FILLET2_R), (10, 0))
            Line((10, 0), (10 + FILLET2_R, 0))
        make_face()
    revolve(axis=Axis((13.32, 35.06, 0), (0, 0, -1)), revolution_arc=90, mode=Mode.SUBTRACT)
    with BuildSketch(Plane(origin=(13.32, 35.06, -43.44), x_dir=(0, 1, 0), z_dir=(-1, 0, 0))) as fillet2_piece_22:
        with BuildLine():
            CenterArc((10 + FILLET2_R, -FILLET2_R), FILLET2_R, 90, 90)
            Line((10 + FILLET2_R, 0), (10, 0))
            Line((10, 0), (10, -FILLET2_R))
        make_face()
    revolve(axis=Axis((13.32, 35.06, -43.44), (0, 0, -1)), revolution_arc=90, mode=Mode.SUBTRACT)
    with BuildSketch(Plane(origin=(2, 97.79, 0), x_dir=(0, -1, 0), z_dir=(1, 0, 0))) as fillet2_piece_23:
        with BuildLine():
            CenterArc((FILLET2_R, FILLET2_R), FILLET2_R, 180, 90)
            Line((0, FILLET2_R), (0, 0))
            Line((0, 0), (FILLET2_R, 0))
        make_face()
    extrude(amount=46.11, mode=Mode.SUBTRACT)
    with BuildSketch(Plane(origin=(48.11, 97.79, -43.44), x_dir=(0, 0, 1), z_dir=(-1, 0, 0))) as fillet2_piece_24:
        with BuildLine():
            CenterArc((FILLET2_R, -FILLET2_R), FILLET2_R, 90, 90)
            Line((0, -FILLET2_R), (0, 0))
            Line((0, 0), (FILLET2_R, 0))
        make_face()
    extrude(amount=46.11, mode=Mode.SUBTRACT)


solid = part.part
